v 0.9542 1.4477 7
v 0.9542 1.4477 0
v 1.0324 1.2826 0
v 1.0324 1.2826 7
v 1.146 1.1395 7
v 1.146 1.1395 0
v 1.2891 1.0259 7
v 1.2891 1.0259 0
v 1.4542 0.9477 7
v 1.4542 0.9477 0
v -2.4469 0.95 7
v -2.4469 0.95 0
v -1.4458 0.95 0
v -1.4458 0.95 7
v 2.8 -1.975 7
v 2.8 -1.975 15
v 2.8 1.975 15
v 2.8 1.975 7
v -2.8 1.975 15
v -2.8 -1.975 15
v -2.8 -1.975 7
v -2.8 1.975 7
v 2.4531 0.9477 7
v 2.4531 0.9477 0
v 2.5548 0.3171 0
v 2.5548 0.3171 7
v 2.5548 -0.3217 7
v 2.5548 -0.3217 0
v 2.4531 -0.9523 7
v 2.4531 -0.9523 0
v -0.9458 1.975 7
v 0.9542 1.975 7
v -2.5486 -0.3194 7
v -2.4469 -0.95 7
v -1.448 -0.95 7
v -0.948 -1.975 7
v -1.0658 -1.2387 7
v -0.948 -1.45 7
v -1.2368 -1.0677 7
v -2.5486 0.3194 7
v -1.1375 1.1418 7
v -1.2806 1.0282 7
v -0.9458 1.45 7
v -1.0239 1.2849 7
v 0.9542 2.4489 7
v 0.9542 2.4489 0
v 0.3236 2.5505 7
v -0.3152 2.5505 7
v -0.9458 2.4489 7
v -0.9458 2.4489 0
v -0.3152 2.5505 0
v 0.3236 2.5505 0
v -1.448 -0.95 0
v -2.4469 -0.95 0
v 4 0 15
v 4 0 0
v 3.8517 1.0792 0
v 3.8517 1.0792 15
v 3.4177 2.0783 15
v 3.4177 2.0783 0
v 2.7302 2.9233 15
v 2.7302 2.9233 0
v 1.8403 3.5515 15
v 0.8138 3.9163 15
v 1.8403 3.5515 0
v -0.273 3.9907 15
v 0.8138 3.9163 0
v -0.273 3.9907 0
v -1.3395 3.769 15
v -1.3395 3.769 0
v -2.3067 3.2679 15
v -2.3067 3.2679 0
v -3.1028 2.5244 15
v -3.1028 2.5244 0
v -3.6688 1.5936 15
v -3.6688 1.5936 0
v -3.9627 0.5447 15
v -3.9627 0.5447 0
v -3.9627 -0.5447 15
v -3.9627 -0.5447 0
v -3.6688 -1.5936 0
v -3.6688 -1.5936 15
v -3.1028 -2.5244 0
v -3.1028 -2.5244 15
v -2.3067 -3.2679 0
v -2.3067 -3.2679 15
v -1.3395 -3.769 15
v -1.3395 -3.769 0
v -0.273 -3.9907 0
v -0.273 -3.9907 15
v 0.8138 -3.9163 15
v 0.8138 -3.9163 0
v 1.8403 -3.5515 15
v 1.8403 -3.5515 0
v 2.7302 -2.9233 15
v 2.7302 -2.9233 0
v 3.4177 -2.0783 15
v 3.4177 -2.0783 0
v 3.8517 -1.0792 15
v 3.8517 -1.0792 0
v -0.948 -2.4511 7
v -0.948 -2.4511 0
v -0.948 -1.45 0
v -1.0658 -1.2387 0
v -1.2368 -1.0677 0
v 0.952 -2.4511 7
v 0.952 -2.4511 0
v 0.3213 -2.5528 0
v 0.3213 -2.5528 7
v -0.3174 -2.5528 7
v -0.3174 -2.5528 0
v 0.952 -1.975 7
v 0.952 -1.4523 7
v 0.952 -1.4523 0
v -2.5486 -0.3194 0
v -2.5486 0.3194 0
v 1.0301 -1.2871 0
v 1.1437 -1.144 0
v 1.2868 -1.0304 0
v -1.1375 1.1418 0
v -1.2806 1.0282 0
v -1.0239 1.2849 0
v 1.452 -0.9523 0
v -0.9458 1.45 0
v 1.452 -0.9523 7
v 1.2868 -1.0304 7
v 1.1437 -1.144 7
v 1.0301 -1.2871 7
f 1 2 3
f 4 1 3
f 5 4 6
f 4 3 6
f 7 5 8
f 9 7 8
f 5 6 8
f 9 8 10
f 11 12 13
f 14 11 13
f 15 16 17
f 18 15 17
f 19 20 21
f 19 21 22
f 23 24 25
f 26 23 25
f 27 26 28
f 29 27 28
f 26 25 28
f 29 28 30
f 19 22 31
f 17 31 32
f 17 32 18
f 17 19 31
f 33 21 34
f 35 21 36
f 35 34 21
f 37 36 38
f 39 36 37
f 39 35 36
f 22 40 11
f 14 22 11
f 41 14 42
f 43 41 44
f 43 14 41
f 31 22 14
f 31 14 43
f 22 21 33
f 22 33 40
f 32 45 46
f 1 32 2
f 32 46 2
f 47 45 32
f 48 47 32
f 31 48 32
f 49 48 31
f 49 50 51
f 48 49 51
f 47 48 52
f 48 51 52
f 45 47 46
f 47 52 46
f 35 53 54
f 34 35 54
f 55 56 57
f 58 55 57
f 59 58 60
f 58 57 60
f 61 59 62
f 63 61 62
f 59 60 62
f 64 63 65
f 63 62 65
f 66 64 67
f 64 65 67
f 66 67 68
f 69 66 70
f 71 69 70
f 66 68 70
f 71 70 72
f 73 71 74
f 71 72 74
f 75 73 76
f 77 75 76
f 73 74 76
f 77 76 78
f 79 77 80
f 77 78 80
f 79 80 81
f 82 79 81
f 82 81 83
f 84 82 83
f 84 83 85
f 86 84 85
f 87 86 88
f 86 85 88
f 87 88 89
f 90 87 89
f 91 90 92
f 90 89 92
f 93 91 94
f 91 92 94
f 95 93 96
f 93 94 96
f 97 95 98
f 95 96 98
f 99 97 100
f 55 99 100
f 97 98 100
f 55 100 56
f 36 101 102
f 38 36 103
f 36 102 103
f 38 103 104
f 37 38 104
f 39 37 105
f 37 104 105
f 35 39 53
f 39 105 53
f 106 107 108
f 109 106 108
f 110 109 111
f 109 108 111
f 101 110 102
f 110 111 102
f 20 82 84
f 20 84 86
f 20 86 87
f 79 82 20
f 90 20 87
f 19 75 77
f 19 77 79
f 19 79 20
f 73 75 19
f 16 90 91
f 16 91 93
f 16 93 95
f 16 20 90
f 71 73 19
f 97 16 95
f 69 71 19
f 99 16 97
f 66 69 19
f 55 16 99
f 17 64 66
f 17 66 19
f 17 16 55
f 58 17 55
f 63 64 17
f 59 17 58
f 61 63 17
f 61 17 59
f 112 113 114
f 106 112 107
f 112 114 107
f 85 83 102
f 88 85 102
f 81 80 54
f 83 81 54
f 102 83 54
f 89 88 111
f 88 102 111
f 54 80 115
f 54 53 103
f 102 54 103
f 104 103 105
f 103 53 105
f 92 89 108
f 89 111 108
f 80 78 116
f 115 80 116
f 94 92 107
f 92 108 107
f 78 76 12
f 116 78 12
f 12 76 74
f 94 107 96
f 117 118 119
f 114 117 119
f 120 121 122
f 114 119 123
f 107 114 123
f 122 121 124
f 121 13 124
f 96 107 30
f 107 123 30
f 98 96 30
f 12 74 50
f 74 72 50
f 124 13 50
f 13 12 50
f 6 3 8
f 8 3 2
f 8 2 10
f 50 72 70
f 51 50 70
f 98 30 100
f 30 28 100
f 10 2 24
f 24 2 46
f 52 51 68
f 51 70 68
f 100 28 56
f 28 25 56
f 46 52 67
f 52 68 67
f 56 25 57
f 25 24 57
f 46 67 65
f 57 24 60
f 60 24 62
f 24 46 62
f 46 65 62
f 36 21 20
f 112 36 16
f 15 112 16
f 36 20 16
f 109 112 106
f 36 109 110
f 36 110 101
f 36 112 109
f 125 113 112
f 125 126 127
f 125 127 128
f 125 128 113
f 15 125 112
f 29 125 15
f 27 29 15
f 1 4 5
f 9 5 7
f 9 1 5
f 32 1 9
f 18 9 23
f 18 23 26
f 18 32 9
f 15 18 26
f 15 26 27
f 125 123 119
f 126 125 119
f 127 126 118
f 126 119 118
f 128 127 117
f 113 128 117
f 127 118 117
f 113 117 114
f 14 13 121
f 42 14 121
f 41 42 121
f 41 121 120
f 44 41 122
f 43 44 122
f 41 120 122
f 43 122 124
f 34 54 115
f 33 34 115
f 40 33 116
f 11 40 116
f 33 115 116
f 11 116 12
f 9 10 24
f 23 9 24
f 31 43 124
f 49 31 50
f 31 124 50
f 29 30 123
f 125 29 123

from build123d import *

# Parameters (mm, degrees)
SKETCH1_R           = 4
BOSS_EXTRUDE1_DEPTH = 15
SKETCH2_W           = 5.6
SKETCH2_H           = 3.95
CUT_EXTRUDE1_DEPTH  = 8
CUT_EXTRUDE2_DEPTH  = 7


with BuildPart() as part:
    # Sketch1 → Boss-Extrude1 (new body)
    with BuildSketch(Plane.XY):
        Circle(SKETCH1_R)
    extrude(amount=BOSS_EXTRUDE1_DEPTH)

    # Sketch2 → Cut-Extrude1 (cut)
    with BuildSketch(Plane.XY.offset(15)):
        Rectangle(SKETCH2_W, SKETCH2_H)
    extrude(amount=-CUT_EXTRUDE1_DEPTH, mode=Mode.SUBTRACT)

    # Sketch3 → Cut-Extrude2 (cut)
    with BuildSketch(Plane(origin=(0, 0, 0), x_dir=(-1, 0, 0), z_dir=(0, 0, -1))):
        with BuildLine():
            Line((0.948044642, -2.451135369), (0.948044642, -1.45))
            ThreePointArc((0.948044642, -1.45), (1.145326424, -1.147281782), (1.448044642, -0.95))
            Line((1.448044642, -0.95), (2.446909273, -0.95))
            ThreePointArc((2.446909273, -0.95), (2.561359119, 0), (2.446909273, 0.95))
            Line((2.446909273, 0.95), (1.445773904, 0.95))
            ThreePointArc((1.445773904, 0.95), (1.137533058, 1.141759153), (0.945773904, 1.45))
            Line((0.945773904, 1.45), (0.945773904, 2.448864631))
            ThreePointArc((0.945773904, 2.448864631), (-0.004226096, 2.563314477), (-0.954226096, 2.448864631))
            Line((-0.954226096, 2.448864631), (-0.954226096, 1.447729262))
            ThreePointArc((-0.954226096, 1.447729262), (-1.145985249, 1.139488415), (-1.454226096, 0.947729262))
            Line((-1.454226096, 0.947729262), (-2.453090727, 0.947729262))
            ThreePointArc((-2.453090727, 0.947729262), (-2.567540573, -0.002270738), (-2.453090727, -0.952270738))
            Line((-2.453090727, -0.952270738), (-1.451955358, -0.952270738))
            ThreePointArc((-1.451955358, -0.952270738), (-1.143714511, -1.144029891), (-0.951955358, -1.452270738))
            Line((-0.951955358, -1.452270738), (-0.951955358, -2.451135369))
            ThreePointArc((-0.951955358, -2.451135369), (-0.001955358, -2.565585215), (0.948044642, -2.451135369))
        make_face()
    extrude(amount=-CUT_EXTRUDE2_DEPTH, mode=Mode.SUBTRACT)


solid = part.part
